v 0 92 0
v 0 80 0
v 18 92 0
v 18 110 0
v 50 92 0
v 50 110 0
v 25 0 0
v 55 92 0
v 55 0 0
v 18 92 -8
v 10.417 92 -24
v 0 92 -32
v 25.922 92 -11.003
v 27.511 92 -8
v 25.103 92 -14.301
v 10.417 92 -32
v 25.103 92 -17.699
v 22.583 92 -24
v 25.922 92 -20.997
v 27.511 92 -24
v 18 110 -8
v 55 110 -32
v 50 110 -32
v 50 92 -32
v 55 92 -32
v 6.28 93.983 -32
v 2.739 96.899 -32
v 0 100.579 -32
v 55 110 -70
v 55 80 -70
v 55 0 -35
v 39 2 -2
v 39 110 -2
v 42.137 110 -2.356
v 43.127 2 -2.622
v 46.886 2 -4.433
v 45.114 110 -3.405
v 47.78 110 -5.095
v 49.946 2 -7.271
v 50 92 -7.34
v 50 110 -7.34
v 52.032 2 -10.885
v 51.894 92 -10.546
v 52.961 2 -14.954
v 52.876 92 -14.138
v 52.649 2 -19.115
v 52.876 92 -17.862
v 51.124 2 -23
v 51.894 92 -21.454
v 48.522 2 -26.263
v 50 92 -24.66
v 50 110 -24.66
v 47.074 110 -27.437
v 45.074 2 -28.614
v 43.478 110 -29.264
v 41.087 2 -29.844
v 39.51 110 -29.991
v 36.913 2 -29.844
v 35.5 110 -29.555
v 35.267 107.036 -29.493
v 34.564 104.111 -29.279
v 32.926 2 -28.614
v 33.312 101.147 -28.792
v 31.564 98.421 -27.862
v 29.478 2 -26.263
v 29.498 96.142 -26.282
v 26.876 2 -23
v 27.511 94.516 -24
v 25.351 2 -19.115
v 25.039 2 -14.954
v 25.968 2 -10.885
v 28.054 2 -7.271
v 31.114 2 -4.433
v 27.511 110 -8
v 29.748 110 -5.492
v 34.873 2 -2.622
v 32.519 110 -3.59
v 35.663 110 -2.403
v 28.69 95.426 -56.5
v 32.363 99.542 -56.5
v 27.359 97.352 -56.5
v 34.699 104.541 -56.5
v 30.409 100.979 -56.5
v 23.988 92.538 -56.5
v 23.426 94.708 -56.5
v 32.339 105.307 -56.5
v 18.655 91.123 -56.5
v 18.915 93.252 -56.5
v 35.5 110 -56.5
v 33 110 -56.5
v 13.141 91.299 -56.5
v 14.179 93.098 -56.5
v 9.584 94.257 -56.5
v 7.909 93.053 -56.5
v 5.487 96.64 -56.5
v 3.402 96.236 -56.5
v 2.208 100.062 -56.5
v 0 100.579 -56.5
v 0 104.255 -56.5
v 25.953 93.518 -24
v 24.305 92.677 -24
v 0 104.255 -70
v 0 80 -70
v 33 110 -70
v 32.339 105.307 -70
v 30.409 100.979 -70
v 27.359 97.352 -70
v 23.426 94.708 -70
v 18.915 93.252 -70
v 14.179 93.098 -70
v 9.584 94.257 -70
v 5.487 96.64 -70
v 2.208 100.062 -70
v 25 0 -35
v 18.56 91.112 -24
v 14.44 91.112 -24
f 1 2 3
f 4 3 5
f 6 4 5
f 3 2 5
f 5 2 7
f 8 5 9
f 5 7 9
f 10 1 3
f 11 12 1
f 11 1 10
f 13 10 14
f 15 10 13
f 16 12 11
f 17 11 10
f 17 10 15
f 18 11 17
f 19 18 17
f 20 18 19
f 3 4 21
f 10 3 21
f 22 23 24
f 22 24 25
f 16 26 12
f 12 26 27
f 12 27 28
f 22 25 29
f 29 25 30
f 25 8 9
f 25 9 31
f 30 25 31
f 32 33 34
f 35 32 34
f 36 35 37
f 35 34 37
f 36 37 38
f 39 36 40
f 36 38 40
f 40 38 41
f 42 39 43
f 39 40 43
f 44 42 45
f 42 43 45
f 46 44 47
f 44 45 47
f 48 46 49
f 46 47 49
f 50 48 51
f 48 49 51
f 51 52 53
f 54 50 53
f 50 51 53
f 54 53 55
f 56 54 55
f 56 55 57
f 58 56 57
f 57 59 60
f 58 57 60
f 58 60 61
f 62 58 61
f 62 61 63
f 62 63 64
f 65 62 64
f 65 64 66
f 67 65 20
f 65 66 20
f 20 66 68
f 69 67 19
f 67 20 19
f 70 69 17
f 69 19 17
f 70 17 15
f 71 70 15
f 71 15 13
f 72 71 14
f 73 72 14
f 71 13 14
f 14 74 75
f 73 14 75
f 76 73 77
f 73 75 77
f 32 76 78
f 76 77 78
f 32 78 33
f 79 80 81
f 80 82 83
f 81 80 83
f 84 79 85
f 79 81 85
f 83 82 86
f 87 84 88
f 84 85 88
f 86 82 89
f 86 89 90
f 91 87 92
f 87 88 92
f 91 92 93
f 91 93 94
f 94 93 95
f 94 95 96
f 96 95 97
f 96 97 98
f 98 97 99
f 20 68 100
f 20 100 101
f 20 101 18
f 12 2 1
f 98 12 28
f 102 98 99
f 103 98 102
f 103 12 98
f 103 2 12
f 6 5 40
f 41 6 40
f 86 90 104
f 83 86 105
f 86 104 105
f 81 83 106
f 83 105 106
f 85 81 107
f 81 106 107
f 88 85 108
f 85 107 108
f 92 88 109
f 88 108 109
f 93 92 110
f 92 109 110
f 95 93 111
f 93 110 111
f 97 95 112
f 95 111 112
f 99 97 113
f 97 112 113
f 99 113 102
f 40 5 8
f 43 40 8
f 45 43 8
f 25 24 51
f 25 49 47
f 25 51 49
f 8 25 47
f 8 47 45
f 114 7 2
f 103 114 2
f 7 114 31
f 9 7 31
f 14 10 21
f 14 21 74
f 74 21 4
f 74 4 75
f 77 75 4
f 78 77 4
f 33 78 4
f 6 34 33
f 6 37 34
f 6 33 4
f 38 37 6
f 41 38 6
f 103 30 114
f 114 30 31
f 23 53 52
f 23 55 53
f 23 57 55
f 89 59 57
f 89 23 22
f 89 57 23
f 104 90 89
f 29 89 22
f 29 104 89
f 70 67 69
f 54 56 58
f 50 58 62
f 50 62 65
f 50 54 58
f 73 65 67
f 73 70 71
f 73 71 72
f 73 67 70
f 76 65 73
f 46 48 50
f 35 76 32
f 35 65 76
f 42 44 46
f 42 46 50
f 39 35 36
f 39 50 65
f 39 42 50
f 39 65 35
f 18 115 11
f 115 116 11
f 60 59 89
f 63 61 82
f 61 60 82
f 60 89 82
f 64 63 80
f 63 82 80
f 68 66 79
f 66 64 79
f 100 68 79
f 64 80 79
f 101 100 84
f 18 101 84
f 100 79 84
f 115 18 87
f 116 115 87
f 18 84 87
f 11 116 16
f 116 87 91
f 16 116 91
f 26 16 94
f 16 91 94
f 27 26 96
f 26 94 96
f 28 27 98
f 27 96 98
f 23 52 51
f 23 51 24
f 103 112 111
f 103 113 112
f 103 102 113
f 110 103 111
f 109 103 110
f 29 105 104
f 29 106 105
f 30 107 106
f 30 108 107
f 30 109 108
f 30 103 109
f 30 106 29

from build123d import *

# Parameters (mm, degrees)
SKETCH1_W           = 55
SKETCH1_H           = 70
BOSS_EXTRUDE1_DEPTH = 110
SKETCH2_R           = 14
CUT_EXTRUDE1_DEPTH  = 108
SKETCH3_W           = 5
SKETCH3_H           = 32
CUT_EXTRUDE2_DEPTH  = 18
SKETCH4_R           = 17
CUT_EXTRUDE3_DEPTH  = 13.5
CUT_EXTRUDE5_REACH  = 137.341
SKETCH5_R           = 19
CUT_EXTRUDE7_REACH  = 143.51
CUT_EXTRUDE8_REACH  = 143.51


with BuildPart() as part:
    # Sketch1 → Boss-Extrude1 (new body)
    with BuildSketch(Plane(origin=(0, 0, 0), x_dir=(1, 0, 0), z_dir=(0, 1, 0))):
        with Locations((27.5, 35)):
            Rectangle(SKETCH1_W, SKETCH1_H)
    extrude(amount=BOSS_EXTRUDE1_DEPTH)

    # Sketch2 → Cut-Extrude1 (cut)
    with BuildSketch(Plane(origin=(0, 110, 0), x_dir=(1, 0, 0), z_dir=(0, 1, 0))):
        with Locations(Location((39, 16, 0), (0, 0, 270))):
            Circle(SKETCH2_R)
    extrude(amount=-CUT_EXTRUDE1_DEPTH, mode=Mode.SUBTRACT)

    # Sketch3 → Cut-Extrude2 (cut)
    with BuildSketch(Plane(origin=(0, 110, 0), x_dir=(1, 0, 0), z_dir=(0, 1, 0))):
        with Locations((52.5, 16)):
            Rectangle(SKETCH3_W, SKETCH3_H)
        Polygon((0, 0), (18, 0), (18, 8), (31.332818552, 8), (31.332818552, 24), (18, 24), (18, 32), (0, 32), align=None)
    extrude(amount=-CUT_EXTRUDE2_DEPTH, mode=Mode.SUBTRACT)

    # Sketch4 → Cut-Extrude3 (cut)
    with BuildSketch(Plane(origin=(0, 0, -70), x_dir=(-1, 0, 0), z_dir=(0, 0, -1))):
        with Locations((-16, 110)):
            Circle(SKETCH4_R)
    extrude(amount=-CUT_EXTRUDE3_DEPTH, mode=Mode.SUBTRACT)

    # Cut-Extrude5: up to this face of the body (flat: up to its plane)
    cut_extrude5_end = Plane(part.part.faces().sort_by_distance((22.755437353, 101, -24))[0])
    # Sketch5 → Cut-Extrude5 (cut, up to the picked face)
    with BuildSketch(Plane(origin=(0, 0, -56.5), x_dir=(-1, 0, 0), z_dir=(0, 0, -1)), mode=Mode.PRIVATE) as cut_extrude5_sk1:
        with Locations((-16.5, 110)):
            Circle(SKETCH5_R)
    cut_extrude5_tool1 = split(extrude(cut_extrude5_sk1.sketch, amount=-CUT_EXTRUDE5_REACH, mode=Mode.PRIVATE), bisect_by=cut_extrude5_end, keep=Keep.BOTH, mode=Mode.PRIVATE)
    add(cut_extrude5_tool1.solids().sort_by(Axis((16.5, 110, -56.5), (0, 0, 1)))[0], mode=Mode.SUBTRACT)

    # Sketch8 → Cut-Extrude7 (cut, up to next)
    with BuildSketch(Plane(origin=(55, 0, 0), x_dir=(0, 0, -1), z_dir=(1, 0, 0)), mode=Mode.PRIVATE) as cut_extrude7_sk1:
        Polygon((70, 0), (70, 80), (35, 0), align=None)
    cut_extrude7_tool1 = extrude(cut_extrude7_sk1.sketch, amount=-CUT_EXTRUDE7_REACH, mode=Mode.PRIVATE) & part.part
    add(cut_extrude7_tool1.solids().sort_by_distance((55, 26.666667, -58.333333))[0], mode=Mode.SUBTRACT)

    # Cut-Extrude8: up to this plane
    cut_extrude8_end = Plane(origin=(-0.001, 80, -70), z_dir=(0, 0.40081883401970747, 0.9161573349021893))
    # Sketch9 → Cut-Extrude8 (cut, up to the surface)
    with BuildSketch(Plane.XY, mode=Mode.PRIVATE) as cut_extrude8_sk1:
        Polygon((0, 0), (25, 0), (0, 80), align=None)
    cut_extrude8_tool1 = split(extrude(cut_extrude8_sk1.sketch, amount=-CUT_EXTRUDE8_REACH, mode=Mode.PRIVATE), bisect_by=cut_extrude8_end, keep=Keep.BOTH, mode=Mode.PRIVATE)
    add(cut_extrude8_tool1.solids().sort_by_distance((8.333333, 26.666667, 0))[0], mode=Mode.SUBTRACT)


solid = part.part
